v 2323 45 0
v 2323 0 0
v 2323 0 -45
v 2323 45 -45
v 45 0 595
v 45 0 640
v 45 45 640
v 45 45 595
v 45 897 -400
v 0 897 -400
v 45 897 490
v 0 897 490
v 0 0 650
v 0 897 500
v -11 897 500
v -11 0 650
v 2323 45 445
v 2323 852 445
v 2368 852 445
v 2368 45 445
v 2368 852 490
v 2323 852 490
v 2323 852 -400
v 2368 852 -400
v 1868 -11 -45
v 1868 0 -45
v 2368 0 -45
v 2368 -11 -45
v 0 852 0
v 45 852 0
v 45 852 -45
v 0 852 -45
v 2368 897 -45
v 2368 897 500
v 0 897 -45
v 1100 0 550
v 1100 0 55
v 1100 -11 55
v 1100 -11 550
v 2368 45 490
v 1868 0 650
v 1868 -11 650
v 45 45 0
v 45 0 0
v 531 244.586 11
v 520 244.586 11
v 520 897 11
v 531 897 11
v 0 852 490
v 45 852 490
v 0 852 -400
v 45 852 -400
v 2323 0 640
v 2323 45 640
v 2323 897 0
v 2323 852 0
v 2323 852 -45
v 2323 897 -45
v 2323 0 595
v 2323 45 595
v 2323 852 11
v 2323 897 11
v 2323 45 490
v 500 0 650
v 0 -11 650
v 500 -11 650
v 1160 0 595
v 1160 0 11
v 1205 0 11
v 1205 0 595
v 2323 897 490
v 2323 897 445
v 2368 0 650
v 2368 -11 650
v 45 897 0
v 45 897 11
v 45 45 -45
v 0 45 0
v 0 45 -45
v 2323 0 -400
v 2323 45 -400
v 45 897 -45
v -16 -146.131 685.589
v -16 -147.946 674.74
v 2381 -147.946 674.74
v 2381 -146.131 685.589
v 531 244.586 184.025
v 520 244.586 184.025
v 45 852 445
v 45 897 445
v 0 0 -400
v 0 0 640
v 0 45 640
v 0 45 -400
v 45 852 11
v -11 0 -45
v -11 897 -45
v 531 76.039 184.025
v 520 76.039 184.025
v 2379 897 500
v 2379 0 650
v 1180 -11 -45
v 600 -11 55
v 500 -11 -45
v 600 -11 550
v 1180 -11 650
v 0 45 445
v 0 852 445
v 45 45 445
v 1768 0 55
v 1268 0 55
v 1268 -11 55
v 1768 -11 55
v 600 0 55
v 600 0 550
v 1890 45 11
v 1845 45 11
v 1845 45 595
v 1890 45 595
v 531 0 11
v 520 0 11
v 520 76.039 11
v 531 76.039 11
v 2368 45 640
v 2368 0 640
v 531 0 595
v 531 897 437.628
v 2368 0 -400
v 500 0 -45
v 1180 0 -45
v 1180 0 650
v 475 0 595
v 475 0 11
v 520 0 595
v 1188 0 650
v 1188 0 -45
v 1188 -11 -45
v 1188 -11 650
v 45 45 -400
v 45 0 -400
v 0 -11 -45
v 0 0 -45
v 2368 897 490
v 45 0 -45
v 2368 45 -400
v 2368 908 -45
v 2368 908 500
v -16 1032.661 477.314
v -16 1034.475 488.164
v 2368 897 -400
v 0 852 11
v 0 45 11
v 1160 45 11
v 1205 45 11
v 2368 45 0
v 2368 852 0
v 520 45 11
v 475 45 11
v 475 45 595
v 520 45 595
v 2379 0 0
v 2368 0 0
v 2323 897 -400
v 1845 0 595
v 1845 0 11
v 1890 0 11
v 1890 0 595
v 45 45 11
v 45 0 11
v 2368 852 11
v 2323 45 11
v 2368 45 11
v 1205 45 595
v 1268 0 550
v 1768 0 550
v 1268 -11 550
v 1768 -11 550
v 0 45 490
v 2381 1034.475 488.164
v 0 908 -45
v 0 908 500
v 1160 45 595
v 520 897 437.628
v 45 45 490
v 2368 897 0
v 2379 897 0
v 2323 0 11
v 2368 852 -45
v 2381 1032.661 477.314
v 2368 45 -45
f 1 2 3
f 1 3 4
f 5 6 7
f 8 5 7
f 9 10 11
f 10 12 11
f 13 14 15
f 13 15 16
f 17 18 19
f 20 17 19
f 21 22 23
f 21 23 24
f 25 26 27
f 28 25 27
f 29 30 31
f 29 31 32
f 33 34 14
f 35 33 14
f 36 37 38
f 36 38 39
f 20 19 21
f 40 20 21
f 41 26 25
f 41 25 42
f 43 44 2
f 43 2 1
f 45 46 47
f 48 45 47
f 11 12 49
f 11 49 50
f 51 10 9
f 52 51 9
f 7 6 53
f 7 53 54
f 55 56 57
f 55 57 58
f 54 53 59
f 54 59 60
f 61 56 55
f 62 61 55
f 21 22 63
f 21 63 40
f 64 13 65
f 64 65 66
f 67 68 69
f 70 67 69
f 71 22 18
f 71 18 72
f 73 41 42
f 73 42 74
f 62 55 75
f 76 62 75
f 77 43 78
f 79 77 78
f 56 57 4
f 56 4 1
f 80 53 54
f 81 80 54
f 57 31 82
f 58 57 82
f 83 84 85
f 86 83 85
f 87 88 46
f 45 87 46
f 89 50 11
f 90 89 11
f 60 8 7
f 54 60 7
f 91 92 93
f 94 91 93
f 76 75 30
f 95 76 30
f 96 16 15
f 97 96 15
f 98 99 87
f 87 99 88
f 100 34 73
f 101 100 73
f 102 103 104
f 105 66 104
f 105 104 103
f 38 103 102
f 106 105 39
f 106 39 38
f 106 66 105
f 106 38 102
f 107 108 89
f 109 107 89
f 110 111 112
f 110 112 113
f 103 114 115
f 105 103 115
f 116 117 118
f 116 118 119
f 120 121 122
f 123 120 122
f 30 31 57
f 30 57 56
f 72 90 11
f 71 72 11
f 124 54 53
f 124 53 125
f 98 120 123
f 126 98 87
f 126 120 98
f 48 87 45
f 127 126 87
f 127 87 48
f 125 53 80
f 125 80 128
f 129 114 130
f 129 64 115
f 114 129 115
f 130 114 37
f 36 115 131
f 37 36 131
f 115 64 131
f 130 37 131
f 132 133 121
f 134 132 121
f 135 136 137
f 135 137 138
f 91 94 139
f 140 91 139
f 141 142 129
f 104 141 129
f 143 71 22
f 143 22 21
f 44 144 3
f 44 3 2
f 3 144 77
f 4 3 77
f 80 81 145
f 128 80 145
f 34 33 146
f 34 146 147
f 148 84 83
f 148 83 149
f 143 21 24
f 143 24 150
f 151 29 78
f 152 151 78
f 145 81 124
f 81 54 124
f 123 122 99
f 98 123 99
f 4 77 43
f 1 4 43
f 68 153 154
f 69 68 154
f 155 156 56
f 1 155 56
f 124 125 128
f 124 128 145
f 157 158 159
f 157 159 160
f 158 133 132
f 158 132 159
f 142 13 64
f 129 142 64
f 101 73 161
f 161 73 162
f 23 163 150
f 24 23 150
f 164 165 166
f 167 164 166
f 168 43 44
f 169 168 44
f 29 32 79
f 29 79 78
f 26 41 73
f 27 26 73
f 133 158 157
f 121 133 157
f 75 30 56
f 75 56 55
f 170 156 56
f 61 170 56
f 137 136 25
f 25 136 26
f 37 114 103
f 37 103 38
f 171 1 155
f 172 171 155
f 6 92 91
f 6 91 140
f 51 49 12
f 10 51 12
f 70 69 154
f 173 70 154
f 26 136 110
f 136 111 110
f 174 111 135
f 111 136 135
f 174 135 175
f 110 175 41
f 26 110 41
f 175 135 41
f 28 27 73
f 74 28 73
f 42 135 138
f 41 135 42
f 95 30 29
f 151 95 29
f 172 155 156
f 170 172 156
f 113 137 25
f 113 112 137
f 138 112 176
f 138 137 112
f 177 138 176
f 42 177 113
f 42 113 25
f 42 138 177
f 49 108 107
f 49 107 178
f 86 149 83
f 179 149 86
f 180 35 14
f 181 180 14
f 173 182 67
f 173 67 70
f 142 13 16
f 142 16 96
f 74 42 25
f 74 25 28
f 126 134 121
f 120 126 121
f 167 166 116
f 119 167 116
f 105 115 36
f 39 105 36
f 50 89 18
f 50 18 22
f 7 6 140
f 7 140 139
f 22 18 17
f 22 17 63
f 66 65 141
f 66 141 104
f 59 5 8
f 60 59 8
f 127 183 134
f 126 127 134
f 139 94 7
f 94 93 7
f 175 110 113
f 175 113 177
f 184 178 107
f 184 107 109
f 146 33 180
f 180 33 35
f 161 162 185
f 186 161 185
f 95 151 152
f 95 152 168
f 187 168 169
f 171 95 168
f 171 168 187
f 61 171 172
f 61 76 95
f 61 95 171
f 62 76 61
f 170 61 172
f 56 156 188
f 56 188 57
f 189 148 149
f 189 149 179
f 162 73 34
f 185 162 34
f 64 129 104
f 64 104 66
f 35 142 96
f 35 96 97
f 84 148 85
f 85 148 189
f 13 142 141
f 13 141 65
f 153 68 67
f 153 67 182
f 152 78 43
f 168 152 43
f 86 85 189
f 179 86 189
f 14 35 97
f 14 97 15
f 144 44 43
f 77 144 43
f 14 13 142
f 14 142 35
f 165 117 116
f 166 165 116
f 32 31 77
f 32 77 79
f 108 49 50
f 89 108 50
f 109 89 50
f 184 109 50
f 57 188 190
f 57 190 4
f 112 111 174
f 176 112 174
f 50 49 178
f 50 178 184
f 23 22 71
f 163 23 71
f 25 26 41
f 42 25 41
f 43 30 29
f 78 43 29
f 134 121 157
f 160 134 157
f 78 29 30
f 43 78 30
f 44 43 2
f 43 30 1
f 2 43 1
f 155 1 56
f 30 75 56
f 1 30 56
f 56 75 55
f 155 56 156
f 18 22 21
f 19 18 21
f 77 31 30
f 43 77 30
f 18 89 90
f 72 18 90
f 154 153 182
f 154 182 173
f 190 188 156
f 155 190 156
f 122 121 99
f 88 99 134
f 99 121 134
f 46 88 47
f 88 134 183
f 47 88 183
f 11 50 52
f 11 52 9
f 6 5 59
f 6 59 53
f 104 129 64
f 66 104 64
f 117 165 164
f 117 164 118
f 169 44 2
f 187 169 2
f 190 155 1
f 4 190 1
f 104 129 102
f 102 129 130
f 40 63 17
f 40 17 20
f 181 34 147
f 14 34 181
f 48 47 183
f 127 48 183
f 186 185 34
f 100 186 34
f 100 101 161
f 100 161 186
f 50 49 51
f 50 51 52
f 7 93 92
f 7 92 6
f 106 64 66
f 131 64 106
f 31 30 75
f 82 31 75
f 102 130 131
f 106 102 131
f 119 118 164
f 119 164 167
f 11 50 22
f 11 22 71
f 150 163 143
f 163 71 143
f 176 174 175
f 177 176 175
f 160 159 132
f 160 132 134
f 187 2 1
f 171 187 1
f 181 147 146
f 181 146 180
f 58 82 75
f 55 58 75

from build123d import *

# Parameters (mm, degrees)
F1_DEPTH       = 11
F3_DEPTH       = 11
F5_DEPTH       = 11
F6_W           = 2368
F6_H           = 545
F7_DEPTH       = 11
F8_W           = 2397
F8_H           = 1197
F9_DEPTH       = 11
F10_W          = 500
F10_H          = 695
F11_DEPTH      = 11
F12_W          = 45
F12_H          = 45
F13_DEPTH      = 640
F13_DEPTH_BACK = 400
F14_W          = 680
F14_H          = 695
F14_W_2        = 500
F14_H_2        = 495
F15_DEPTH      = 11
F16_W          = 45
F16_H          = 45
F17_DEPTH      = 490
F17_DEPTH_BACK = 400
F18_W          = 45
F18_H          = 45
F19_DEPTH      = 807
F20_W          = 45
F20_H          = 45
F21_DEPTH      = 807
F22_W          = 45
F22_H          = 45
F23_DEPTH      = 2278
F24_W          = 45
F24_H          = 45
F25_DEPTH      = 2278
F26_W          = 45
F26_H          = 45
F27_DEPTH      = 807
F28_W          = 45
F28_H          = 45
F29_DEPTH      = 584
F31_DEPTH      = 11


with BuildPart() as f1:
    # F0 (on Top) → F1 (new body)
    with BuildSketch(Plane.XY):
        Polygon((45, 45), (45, 0), (2323, 0), (2323, 45), (2368, 45), (2368, 852), (2323, 852), (2323, 897), (45, 897), (45, 852), (0, 852), (0, 45), align=None)
    extrude(amount=F1_DEPTH)


with BuildPart() as f3:
    # F2 (on Right) → F3 (new body)
    with BuildSketch(Plane.YZ):
        Polygon((897, -45), (897, 0), (897, 500), (0, 650), (0, 0), (0, -45), align=None)
    extrude(amount=-F3_DEPTH)


with BuildPart() as f5:
    # F4 (on face) → F5 (new body)
    with BuildSketch(Plane.YZ.offset(2368)):
        Polygon((0, 650), (0, 0), (897, 0), (897, 500), align=None)
    extrude(amount=F5_DEPTH)


with BuildPart() as f7:
    # F6 (on face) → F7 (new body)
    with BuildSketch(Plane(origin=(0, 897, 0), x_dir=(-1, 0, 0), z_dir=(0, 1, 0))):
        with Locations((-1184, 227.5)):
            Rectangle(F6_W, F6_H)
    extrude(amount=F7_DEPTH)


with BuildPart() as f9:
    # F8 (on face) → F9 (new body)
    with BuildSketch(Plane(origin=(0, 105.738784, 632.317929), x_dir=(1, 0, 0), z_dir=(0, 0.164934, 0.986305))):
        with Locations((1182.5, 341.292976)):
            Rectangle(F8_W, F8_H)
    extrude(amount=F9_DEPTH)


with BuildPart() as f11:
    # F10 (on Front) → F11 (new body)
    with BuildSketch(Plane.XZ):
        with Locations((250, 302.5)):
            Rectangle(F10_W, F10_H)
        with Locations((2118, 302.5)):
            Rectangle(F10_W, F10_H)
    extrude(amount=F11_DEPTH)


with BuildPart() as f13:
    # F12 (on Top) → F13 (new body, two sides)
    with BuildSketch(Plane.XY) as f13_sk:
        with Locations((22.5, 22.5)):
            Rectangle(F12_W, F12_H)
        with Locations((2345.5, 22.5)):
            Rectangle(F12_W, F12_H)
    extrude(amount=F13_DEPTH)
    extrude(f13_sk.sketch, amount=-F13_DEPTH_BACK)


with BuildPart() as f15:
    # F14 (on Front) → F15 (new body)
    with BuildSketch(Plane.XZ):
        with Locations((840, 302.5)):
            Rectangle(F14_W, F14_H)
        with Locations((850, 302.5)):
            Rectangle(F14_W_2, F14_H_2, mode=Mode.SUBTRACT)
        with Locations((1528, 302.5)):
            Rectangle(F14_W, F14_H)
        with Locations((1518, 302.5)):
            Rectangle(F14_W_2, F14_H_2, mode=Mode.SUBTRACT)
    extrude(amount=F15_DEPTH)


with BuildPart() as f17:
    # F16 (on Top) → F17 (new body, two sides)
    with BuildSketch(Plane.XY) as f17_sk:
        with Locations((22.5, 874.5)):
            Rectangle(F16_W, F16_H)
        with Locations((2345.5, 874.5)):
            Rectangle(F16_W, F16_H)
    extrude(amount=F17_DEPTH)
    extrude(f17_sk.sketch, amount=-F17_DEPTH_BACK)


with BuildPart() as f19:
    # F18 (on face) → F19 (new body, through all)
    with BuildSketch(Plane(origin=(0, 45, 0), x_dir=(-1, 0, 0), z_dir=(0, 1, 0))):
        with Locations((-22.5, -22.5)):
            Rectangle(F18_W, F18_H)
    extrude(amount=F19_DEPTH)


with BuildPart() as f21:
    # F20 (on face) → F21 (new body, through all)
    with BuildSketch(Plane(origin=(0, 45, 0), x_dir=(-1, 0, 0), z_dir=(0, 1, 0))):
        with Locations((-2345.5, -22.5)):
            Rectangle(F20_W, F20_H)
    extrude(amount=F21_DEPTH)


with BuildPart() as f23:
    # F22 (on face) → F23 (new body, through all)
    with BuildSketch(Plane.YZ.offset(45)):
        with Locations((22.5, -22.5)):
            Rectangle(F22_W, F22_H)
        with Locations((874.5, -22.5)):
            Rectangle(F22_W, F22_H)
    extrude(amount=F23_DEPTH)


with BuildPart() as f25:
    # F24 (on face) → F25 (new body, through all)
    with BuildSketch(Plane.YZ.offset(45)):
        with Locations((22.5, 617.5)):
            Rectangle(F24_W, F24_H)
        with Locations((874.5, 467.5)):
            Rectangle(F24_W, F24_H)
    extrude(amount=F25_DEPTH)


with BuildPart() as f27:
    # F26 (on face) → F27 (new body, through all)
    with BuildSketch(Plane.XZ.offset(-852)):
        with Locations((22.5, 467.5)):
            Rectangle(F26_W, F26_H)
        with Locations((2345.5, 467.5)):
            Rectangle(F26_W, F26_H)
    extrude(amount=F27_DEPTH)


with BuildPart() as f29:
    # F28 (on face) → F29 (new body, through all)
    with BuildSketch(Plane.XY.offset(11)):
        with Locations((1182.5, 22.5)):
            Rectangle(F28_W, F28_H)
        with Locations((1867.5, 22.5)):
            Rectangle(F28_W, F28_H)
        with Locations((497.5, 22.5)):
            Rectangle(F28_W, F28_H)
    extrude(amount=F29_DEPTH)


with BuildPart() as f31:
    # F30 (on face) → F31 (new body)
    with BuildSketch(Plane.YZ.offset(520)):
        Polygon((0, 595), (0, 11), (76.038614, 11), (76.038614, 184.025198), (244.586274, 184.025198), (244.586274, 11), (897, 11), (897, 437.627852), align=None)
    extrude(amount=F31_DEPTH)


solid = Compound([f1.part, f3.part, f5.part, f7.part, f9.part, f11.part, f13.part, f15.part, f17.part, f19.part, f21.part, f23.part, f25.part, f27.part, f29.part, f31.part])
